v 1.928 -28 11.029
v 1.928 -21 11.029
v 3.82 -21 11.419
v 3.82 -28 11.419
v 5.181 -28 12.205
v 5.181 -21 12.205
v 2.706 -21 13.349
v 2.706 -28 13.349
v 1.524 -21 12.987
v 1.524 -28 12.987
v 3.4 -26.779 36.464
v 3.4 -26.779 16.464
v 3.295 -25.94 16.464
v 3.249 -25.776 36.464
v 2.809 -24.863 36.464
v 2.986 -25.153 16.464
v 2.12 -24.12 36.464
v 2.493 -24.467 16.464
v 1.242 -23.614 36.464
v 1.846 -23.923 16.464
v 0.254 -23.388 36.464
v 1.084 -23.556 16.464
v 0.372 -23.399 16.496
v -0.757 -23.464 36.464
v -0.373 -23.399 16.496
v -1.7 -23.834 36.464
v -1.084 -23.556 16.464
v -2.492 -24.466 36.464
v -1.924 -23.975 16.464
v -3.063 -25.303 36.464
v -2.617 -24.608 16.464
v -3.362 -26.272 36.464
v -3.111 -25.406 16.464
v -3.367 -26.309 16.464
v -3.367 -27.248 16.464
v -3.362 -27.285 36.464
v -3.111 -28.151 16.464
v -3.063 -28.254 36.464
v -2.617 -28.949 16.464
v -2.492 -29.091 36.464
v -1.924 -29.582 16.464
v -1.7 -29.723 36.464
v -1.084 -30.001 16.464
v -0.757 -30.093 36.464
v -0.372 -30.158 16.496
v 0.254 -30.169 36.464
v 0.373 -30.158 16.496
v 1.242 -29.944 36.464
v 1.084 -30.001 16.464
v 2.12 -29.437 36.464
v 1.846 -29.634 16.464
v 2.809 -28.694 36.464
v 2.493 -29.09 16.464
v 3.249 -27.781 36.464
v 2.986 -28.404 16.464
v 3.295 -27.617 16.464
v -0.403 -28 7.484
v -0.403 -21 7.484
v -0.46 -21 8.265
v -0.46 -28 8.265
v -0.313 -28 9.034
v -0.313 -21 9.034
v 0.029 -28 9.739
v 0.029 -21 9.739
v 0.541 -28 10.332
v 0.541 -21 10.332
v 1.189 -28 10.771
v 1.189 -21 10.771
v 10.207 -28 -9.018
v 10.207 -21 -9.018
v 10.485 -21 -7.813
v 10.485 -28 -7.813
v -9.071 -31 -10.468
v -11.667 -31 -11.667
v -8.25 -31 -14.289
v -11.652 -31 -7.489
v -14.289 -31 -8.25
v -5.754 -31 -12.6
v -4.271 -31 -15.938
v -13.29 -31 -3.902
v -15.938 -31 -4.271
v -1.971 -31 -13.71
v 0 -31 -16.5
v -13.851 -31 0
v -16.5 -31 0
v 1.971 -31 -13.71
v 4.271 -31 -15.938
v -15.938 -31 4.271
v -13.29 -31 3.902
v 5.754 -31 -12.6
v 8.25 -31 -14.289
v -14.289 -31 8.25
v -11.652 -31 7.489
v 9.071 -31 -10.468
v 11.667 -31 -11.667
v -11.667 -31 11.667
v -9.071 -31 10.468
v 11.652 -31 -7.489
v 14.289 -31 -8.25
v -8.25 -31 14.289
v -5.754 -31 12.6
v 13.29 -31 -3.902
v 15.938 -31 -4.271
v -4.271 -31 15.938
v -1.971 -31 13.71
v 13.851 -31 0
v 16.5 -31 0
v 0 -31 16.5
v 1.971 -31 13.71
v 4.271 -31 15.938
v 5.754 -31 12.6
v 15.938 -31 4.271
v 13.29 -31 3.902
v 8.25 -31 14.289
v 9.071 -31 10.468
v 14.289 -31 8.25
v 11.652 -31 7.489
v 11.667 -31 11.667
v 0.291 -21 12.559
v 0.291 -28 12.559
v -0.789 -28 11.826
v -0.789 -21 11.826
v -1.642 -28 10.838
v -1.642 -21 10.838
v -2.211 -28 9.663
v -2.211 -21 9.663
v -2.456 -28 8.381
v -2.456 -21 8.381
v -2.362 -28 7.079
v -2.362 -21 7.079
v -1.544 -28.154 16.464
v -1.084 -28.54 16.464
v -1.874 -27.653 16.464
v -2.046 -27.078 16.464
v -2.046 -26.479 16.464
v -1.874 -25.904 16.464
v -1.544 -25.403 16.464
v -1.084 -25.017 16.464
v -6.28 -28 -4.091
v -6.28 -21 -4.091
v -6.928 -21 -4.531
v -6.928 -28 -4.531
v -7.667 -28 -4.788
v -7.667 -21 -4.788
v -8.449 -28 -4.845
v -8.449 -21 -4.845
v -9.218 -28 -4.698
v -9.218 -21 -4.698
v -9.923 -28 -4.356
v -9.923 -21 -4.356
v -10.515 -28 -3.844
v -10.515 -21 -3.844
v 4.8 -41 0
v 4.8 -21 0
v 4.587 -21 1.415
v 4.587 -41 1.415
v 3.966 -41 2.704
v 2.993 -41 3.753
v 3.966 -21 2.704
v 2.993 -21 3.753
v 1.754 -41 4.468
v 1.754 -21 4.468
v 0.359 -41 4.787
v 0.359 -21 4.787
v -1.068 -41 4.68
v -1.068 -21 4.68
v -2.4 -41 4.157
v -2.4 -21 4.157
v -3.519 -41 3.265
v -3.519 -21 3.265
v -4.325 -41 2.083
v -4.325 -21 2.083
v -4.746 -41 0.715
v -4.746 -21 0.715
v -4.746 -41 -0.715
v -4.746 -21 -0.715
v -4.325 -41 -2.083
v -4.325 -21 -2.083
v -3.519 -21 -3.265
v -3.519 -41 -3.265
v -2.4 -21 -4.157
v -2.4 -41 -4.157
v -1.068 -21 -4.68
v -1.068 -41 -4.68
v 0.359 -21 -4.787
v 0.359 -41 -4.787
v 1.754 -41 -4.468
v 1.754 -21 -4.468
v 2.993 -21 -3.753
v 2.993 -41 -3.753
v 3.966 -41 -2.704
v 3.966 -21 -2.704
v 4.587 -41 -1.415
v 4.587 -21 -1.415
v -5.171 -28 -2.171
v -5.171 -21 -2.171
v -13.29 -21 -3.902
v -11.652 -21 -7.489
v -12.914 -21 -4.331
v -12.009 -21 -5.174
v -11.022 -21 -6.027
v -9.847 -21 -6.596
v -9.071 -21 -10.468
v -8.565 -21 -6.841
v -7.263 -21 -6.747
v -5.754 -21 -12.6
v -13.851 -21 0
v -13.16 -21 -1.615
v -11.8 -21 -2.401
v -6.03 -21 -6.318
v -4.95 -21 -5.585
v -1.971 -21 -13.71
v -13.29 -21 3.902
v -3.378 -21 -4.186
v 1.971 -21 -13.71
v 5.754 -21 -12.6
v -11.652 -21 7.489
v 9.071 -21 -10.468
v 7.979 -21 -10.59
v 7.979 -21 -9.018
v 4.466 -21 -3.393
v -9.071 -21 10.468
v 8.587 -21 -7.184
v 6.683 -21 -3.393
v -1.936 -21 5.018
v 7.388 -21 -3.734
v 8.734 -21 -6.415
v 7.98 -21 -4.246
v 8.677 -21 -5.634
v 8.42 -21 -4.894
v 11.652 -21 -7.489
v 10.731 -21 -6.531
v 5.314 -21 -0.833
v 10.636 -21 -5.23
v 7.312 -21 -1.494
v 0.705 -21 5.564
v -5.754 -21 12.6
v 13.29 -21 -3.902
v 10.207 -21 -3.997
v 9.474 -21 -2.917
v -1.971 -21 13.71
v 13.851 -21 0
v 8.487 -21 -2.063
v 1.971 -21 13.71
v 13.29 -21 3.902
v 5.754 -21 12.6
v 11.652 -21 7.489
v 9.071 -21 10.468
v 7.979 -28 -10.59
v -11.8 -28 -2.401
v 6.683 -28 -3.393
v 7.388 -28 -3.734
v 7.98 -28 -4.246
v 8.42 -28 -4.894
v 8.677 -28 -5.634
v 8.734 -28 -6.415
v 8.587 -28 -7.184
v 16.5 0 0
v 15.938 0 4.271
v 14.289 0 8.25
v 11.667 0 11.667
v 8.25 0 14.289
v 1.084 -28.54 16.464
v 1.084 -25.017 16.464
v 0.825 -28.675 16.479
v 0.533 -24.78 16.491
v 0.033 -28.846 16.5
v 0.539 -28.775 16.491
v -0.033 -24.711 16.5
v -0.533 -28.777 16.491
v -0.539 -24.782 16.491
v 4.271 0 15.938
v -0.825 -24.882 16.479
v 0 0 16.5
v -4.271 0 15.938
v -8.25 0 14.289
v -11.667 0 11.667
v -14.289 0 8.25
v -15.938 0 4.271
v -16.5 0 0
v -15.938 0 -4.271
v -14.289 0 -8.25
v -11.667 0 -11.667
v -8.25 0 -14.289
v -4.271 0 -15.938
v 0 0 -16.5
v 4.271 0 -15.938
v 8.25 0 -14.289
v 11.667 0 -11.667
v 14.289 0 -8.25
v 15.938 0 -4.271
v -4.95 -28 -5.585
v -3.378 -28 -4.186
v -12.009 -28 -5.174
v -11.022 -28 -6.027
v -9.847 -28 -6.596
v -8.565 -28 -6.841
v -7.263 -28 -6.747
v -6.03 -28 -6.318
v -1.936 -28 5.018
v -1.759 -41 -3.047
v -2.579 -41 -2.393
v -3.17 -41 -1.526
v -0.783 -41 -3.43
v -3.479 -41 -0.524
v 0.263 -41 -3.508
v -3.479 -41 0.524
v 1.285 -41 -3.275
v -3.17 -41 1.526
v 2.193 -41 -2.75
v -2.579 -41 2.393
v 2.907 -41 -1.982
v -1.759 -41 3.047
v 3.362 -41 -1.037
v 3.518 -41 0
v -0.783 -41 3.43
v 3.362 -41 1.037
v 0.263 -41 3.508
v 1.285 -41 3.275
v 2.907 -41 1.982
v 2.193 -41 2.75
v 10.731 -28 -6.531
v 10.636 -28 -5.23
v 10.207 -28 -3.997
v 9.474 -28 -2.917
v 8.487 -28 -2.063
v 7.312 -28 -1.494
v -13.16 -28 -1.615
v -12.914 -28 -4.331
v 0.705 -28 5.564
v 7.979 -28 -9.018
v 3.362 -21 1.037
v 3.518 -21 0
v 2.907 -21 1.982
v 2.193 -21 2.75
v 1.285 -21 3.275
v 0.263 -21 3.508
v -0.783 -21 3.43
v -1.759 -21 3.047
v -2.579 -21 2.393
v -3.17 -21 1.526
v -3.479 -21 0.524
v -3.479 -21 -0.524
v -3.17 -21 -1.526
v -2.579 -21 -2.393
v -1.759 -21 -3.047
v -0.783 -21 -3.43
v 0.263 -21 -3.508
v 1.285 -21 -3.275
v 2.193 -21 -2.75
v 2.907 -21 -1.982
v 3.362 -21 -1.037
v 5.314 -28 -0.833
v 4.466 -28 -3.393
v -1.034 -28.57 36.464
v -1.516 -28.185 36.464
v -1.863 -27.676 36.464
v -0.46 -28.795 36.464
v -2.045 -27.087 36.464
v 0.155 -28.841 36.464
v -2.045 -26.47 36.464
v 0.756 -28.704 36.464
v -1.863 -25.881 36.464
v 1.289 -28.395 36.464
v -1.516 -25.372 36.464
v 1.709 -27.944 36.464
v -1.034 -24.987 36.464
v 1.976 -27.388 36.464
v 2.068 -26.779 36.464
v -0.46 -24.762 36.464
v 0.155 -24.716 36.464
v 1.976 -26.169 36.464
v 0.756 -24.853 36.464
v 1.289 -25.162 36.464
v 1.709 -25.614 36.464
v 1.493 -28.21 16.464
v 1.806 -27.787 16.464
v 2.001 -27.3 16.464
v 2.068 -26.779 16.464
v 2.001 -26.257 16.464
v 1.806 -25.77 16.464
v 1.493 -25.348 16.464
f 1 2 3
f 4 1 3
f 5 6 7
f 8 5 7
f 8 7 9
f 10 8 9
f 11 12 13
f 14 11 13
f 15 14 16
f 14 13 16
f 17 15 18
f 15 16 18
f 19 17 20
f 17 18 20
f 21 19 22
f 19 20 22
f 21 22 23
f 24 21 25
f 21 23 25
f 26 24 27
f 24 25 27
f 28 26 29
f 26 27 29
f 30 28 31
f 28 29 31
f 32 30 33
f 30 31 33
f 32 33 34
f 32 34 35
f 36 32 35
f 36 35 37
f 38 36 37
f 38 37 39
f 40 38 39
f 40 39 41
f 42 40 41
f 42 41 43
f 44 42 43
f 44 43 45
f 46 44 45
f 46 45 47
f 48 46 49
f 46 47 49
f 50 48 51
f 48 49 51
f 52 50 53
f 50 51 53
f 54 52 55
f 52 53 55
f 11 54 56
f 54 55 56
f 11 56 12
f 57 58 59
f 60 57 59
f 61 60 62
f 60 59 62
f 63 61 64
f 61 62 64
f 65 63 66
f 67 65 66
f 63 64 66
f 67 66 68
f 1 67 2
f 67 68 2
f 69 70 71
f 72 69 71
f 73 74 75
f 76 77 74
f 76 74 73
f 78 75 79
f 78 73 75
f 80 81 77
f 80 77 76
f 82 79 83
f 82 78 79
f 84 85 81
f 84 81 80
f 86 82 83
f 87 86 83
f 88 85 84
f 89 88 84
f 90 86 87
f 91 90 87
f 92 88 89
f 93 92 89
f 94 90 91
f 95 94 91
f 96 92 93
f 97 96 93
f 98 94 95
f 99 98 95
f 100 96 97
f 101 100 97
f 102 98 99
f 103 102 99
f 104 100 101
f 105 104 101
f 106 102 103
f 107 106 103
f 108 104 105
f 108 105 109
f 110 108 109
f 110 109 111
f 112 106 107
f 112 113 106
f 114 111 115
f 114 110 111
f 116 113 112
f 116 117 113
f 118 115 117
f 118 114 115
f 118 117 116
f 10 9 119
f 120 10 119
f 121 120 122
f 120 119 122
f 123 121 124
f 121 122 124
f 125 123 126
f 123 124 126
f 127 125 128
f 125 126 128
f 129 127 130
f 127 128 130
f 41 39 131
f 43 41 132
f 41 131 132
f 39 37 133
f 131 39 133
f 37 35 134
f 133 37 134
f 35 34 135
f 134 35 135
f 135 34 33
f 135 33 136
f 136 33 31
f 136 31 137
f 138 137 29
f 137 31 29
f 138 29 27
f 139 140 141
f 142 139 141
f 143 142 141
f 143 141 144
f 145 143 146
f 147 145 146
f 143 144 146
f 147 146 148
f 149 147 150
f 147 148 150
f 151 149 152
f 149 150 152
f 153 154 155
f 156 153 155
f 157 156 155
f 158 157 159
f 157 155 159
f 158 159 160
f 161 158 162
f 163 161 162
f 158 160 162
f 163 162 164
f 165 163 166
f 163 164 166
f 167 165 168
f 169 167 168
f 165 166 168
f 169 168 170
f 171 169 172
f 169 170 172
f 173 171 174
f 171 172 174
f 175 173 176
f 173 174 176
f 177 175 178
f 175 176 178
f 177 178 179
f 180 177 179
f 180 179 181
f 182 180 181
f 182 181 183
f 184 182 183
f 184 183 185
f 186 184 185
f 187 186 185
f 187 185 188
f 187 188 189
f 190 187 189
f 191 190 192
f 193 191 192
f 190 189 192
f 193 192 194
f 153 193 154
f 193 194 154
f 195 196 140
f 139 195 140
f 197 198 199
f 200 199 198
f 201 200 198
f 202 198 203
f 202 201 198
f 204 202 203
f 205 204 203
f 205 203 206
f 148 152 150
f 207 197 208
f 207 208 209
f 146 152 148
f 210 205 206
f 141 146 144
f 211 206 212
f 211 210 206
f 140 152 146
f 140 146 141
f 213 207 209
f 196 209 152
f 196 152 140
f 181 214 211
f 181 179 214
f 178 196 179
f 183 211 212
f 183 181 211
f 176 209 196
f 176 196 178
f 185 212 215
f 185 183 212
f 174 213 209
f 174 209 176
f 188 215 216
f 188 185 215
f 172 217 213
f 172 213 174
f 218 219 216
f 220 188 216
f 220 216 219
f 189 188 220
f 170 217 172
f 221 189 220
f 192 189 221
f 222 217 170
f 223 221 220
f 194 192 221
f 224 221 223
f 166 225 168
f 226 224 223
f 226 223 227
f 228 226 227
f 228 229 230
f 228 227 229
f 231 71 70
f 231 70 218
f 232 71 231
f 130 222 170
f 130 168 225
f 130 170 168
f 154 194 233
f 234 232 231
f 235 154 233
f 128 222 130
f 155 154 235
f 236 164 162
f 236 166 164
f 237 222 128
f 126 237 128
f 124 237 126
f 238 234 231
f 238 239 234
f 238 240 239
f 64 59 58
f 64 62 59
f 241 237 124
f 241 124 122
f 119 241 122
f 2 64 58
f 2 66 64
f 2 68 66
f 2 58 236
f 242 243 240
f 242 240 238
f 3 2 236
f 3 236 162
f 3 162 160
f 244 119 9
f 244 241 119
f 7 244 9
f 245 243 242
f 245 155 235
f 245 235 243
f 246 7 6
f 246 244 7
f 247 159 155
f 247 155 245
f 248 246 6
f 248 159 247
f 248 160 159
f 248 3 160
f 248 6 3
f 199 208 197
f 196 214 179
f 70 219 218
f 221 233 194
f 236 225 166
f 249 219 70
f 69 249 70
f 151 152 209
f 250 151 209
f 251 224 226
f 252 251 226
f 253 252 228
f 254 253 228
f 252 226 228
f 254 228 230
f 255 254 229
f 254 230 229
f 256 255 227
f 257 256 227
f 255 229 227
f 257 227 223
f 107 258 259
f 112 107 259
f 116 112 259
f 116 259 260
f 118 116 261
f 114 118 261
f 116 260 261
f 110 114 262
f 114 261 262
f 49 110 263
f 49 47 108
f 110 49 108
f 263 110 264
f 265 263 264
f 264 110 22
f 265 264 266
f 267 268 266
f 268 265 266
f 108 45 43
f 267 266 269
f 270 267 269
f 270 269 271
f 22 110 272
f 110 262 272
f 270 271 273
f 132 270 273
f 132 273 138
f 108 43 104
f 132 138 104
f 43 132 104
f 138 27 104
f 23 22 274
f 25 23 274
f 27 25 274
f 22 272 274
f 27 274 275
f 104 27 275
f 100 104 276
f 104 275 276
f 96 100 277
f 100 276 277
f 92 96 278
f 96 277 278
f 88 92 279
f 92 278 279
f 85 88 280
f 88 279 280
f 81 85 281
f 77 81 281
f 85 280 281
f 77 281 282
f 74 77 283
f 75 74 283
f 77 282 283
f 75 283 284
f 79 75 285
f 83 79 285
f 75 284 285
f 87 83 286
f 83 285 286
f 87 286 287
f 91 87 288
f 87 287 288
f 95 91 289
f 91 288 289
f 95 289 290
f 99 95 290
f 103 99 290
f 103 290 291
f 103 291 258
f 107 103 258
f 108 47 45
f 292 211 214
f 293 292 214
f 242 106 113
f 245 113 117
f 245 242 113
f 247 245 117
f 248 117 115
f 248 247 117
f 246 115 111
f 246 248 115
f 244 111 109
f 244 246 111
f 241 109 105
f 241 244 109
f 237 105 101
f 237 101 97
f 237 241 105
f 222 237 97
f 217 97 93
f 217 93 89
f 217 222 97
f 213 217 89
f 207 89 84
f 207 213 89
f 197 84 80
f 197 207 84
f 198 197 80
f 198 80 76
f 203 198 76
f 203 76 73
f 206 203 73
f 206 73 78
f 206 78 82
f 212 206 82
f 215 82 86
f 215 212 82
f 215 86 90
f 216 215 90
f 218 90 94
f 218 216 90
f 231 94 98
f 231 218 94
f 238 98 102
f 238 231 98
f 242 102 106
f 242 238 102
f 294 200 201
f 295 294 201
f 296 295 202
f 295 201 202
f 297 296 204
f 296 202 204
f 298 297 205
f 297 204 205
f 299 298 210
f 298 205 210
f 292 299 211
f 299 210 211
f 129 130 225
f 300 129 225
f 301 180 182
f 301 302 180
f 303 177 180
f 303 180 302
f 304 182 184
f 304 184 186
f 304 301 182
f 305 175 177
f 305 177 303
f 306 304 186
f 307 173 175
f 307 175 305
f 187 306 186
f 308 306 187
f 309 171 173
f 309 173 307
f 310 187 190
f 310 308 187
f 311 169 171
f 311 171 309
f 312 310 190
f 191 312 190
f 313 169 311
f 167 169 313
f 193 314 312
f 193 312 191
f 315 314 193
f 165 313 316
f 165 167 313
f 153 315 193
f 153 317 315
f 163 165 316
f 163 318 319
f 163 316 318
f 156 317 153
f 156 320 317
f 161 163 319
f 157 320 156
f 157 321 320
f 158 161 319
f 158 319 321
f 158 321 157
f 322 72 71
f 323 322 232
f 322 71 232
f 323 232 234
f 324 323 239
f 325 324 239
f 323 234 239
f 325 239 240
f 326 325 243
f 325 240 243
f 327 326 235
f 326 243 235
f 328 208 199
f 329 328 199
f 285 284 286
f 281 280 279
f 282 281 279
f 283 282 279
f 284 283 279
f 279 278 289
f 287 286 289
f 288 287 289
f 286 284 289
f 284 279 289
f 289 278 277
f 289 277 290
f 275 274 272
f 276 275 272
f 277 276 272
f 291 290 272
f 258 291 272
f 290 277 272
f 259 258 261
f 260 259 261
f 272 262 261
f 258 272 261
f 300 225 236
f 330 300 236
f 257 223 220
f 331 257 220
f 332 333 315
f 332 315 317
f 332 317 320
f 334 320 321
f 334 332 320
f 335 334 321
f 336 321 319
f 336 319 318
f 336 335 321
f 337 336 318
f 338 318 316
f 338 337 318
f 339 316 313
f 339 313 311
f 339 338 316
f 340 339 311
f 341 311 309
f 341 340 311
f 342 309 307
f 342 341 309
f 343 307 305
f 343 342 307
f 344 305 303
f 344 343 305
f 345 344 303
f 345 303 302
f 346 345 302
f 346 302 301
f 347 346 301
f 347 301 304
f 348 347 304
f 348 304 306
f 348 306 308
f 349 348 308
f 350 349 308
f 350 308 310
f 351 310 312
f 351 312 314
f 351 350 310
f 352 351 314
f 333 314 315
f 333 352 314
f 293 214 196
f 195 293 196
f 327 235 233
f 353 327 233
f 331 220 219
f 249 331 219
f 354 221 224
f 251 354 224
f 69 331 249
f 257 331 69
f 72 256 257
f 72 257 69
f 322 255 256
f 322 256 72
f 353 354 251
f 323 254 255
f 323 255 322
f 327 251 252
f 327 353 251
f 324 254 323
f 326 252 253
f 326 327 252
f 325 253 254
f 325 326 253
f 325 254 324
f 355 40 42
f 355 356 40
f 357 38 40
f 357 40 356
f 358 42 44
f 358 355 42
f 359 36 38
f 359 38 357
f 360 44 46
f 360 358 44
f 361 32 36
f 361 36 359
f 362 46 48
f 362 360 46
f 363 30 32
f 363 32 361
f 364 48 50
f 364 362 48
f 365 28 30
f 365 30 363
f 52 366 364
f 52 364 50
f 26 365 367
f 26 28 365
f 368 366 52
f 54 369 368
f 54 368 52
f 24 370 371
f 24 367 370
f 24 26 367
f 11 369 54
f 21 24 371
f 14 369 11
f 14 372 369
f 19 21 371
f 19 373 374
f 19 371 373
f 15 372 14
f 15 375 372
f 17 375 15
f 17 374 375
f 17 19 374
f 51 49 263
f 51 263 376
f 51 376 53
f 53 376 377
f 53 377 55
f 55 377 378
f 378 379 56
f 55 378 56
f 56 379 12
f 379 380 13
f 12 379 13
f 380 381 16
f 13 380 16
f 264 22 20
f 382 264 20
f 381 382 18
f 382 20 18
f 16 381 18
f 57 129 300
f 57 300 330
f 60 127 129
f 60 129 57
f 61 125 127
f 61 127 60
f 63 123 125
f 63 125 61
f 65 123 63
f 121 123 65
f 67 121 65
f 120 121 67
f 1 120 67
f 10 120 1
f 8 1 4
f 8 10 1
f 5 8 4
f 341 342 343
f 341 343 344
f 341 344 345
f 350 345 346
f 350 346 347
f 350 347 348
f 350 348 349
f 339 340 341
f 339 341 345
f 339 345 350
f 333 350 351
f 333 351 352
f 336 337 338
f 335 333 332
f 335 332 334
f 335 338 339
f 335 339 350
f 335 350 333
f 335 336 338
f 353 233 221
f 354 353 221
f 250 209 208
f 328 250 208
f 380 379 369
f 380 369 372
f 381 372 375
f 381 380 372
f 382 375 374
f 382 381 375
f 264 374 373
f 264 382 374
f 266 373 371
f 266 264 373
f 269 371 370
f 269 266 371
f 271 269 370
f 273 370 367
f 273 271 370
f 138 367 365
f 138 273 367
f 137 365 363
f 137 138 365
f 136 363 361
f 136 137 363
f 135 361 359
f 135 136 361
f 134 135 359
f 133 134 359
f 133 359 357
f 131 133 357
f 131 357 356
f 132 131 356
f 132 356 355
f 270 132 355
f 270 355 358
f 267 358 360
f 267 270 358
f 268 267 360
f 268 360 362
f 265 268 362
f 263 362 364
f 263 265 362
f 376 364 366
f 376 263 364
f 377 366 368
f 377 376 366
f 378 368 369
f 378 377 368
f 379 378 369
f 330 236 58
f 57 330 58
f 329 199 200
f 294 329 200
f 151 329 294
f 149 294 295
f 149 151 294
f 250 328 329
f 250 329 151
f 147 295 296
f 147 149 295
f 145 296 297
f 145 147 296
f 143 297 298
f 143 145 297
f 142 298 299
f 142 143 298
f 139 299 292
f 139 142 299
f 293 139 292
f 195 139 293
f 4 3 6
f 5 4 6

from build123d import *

# Parameters (mm, degrees)
F0_R      = 16.5
F1_DEPTH  = 21
F2_R      = 16.5
F2_R_2    = 13.851235
F3_DEPTH  = 10
F4_R      = 4.8
F4_R_2    = 3.518021
F5_DEPTH  = 20
F7_DEPTH  = 7
F10_R     = 3.4
F10_R_2   = 2.068138
F11_DEPTH = 20


with BuildPart() as f1:
    # F0 (on Front) → F1 (new body)
    with BuildSketch(Plane.XZ):
        Circle(F0_R)
    extrude(amount=F1_DEPTH)

    # F2 (on face) → F3 (join)
    with BuildSketch(Plane.XZ.offset(21)):
        Circle(F2_R)
        Circle(F2_R_2, mode=Mode.SUBTRACT)
    extrude(amount=F3_DEPTH)

    # F4 (on face) → F5 (join)
    with BuildSketch(Plane.XZ.offset(21)):
        Circle(F4_R)
        Circle(F4_R_2, mode=Mode.SUBTRACT)
    extrude(amount=F5_DEPTH)

    # F6 (on face) → F7 (join)
    with BuildSketch(Plane.XZ.offset(21)):
        with BuildLine():
            Line((10.207186, -9.018168), (10.485276, -7.813368))
            ThreePointArc((10.485276, -7.813368), (10.207186, -3.996652), (7.31172, -1.494465))
            Line((7.31172, -1.494465), (5.314166, -0.832571))
            Line((5.314166, -0.832571), (4.465776, -3.392957))
            Line((4.465776, -3.392957), (6.68265, -3.392957))
            ThreePointArc((6.68265, -3.392957), (8.41993, -4.894269), (8.586784, -7.184299))
            Line((8.586784, -7.184299), (7.979127, -9.018168))
            Line((7.979127, -9.018168), (7.979127, -10.589611))
            Line((7.979127, -10.589611), (10.207186, -9.018168))
        make_face()
        with BuildLine():
            ThreePointArc((1.523938, 12.987199), (-1.642391, 10.838008), (-2.361615, 7.079367))
            Line((-2.361615, 7.079367), (-1.936055, 5.018488))
            Line((-1.936055, 5.018488), (0.705499, 5.563954))
            Line((0.705499, 5.563954), (-0.402938, 7.483823))
            ThreePointArc((-0.402938, 7.483823), (0.028596, 9.739007), (1.928393, 11.028522))
            Line((1.928393, 11.028522), (3.820399, 11.419211))
            Line((3.820399, 11.419211), (5.181308, 12.204932))
            Line((5.181308, 12.204932), (2.70637, 13.348766))
            Line((2.70637, 13.348766), (1.523938, 12.987199))
        make_face()
        with BuildLine():
            ThreePointArc((-12.009213, -5.173831), (-8.564795, -6.841356), (-4.950104, -5.584903))
            Line((-4.950104, -5.584903), (-3.378111, -4.185917))
            Line((-3.378111, -4.185917), (-5.171275, -2.170997))
            Line((-5.171275, -2.170997), (-6.279712, -4.090866))
            ThreePointArc((-6.279712, -4.090866), (-8.448526, -4.844738), (-10.515177, -3.844223))
            Line((-10.515177, -3.844223), (-11.799526, -2.401043))
            Line((-11.799526, -2.401043), (-13.160435, -1.615321))
            Line((-13.160435, -1.615321), (-12.913556, -4.330598))
            Line((-12.913556, -4.330598), (-12.009213, -5.173831))
        make_face()
    extrude(amount=F7_DEPTH)

    # F10 (on plane+point) → F11 (join)
    with BuildSketch(Plane.XY.offset(16.464327)):
        with Locations((0, -26.77853)):
            Circle(F10_R)
        with Locations((0, -26.77853)):
            Circle(F10_R_2, mode=Mode.SUBTRACT)
    extrude(amount=F11_DEPTH)


solid = f1.part
